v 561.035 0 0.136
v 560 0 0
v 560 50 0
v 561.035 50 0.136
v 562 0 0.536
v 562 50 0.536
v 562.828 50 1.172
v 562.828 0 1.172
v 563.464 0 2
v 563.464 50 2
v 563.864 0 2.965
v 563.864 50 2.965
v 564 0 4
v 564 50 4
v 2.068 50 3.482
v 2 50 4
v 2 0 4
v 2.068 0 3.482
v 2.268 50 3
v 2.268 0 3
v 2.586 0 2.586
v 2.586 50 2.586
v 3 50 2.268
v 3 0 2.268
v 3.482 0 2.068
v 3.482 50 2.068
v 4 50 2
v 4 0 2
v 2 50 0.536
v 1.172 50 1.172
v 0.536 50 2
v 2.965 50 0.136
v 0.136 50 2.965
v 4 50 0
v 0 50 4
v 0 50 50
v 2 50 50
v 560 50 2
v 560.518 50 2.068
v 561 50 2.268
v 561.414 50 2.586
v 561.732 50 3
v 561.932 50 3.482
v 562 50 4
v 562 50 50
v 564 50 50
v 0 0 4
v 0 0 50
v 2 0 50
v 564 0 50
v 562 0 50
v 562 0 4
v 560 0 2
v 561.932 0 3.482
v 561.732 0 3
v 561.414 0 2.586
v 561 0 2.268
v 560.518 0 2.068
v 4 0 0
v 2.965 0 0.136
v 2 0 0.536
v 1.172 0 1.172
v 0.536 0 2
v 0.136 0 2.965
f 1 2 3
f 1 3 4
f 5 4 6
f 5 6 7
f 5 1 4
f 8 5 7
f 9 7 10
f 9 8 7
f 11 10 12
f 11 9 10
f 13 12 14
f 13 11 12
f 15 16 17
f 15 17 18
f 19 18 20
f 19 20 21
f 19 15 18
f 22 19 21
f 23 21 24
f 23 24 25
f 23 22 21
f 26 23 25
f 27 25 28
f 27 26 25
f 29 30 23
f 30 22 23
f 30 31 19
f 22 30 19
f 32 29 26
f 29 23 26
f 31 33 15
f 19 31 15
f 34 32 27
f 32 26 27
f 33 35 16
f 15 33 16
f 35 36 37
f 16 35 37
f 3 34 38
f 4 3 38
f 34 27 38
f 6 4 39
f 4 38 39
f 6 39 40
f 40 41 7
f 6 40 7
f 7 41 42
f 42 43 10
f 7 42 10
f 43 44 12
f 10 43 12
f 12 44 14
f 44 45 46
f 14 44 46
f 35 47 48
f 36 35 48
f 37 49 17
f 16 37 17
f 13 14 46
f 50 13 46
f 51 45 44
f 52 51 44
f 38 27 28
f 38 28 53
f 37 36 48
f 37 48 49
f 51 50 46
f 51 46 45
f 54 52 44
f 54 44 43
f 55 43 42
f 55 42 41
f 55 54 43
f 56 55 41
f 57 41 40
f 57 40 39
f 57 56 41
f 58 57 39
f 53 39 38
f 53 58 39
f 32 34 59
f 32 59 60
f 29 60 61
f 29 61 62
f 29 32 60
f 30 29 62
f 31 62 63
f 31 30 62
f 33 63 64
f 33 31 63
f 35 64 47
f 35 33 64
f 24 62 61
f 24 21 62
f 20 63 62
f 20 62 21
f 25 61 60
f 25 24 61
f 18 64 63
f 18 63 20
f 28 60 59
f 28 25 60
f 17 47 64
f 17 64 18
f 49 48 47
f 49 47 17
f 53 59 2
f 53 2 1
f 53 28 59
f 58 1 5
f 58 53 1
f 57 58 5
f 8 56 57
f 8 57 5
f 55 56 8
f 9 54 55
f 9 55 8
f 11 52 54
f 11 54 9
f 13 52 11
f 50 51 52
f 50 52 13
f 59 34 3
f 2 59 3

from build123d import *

# Parameters (mm, degrees)
SKETCH_1_W                       = 564
SKETCH_1_H                       = 50
SM_BASE_FLANGE_1_DEPTH           = 2
SM_EDGE_FLANGE_1_STRIP_W         = 12
SM_EDGE_FLANGE_1_STRIP_H         = 2
SM_EDGE_FLANGE_1_STRIP_CUT_DEPTH = 50
SM_EDGE_FLANGE_1_DEPTH           = 50
SM_EDGE_FLANGE_2_STRIP_W         = 12
SM_EDGE_FLANGE_2_STRIP_H         = 2
SM_EDGE_FLANGE_2_STRIP_CUT_DEPTH = 50
SM_EDGE_FLANGE_2_DEPTH           = 50


# Sheet-metal steps are written as plain solids
with BuildPart() as part:
    # Sketch 1 → Базовая кромка1 (new body)
    with BuildSketch(Plane.XY):
        with Locations((282, 25)):
            Rectangle(SKETCH_1_W, SKETCH_1_H)
    extrude(amount=SM_BASE_FLANGE_1_DEPTH)

    # Ребро-кромка1 strip (across the edge) → Ребро-кромка1 strip cut (cut)
    with BuildSketch(Plane(origin=(0, 50, 2), x_dir=(1, 0, 0), z_dir=(0, -1, 0))):
        with Locations((-2, -1)):
            Rectangle(SM_EDGE_FLANGE_1_STRIP_W, SM_EDGE_FLANGE_1_STRIP_H)
    extrude(amount=SM_EDGE_FLANGE_1_STRIP_CUT_DEPTH, mode=Mode.SUBTRACT)

    # Ребро-кромка1 section (across the edge) → Ребро-кромка1 (add)
    with BuildSketch(Plane(origin=(0, 50, 2), x_dir=(1, 0, 0), z_dir=(0, -1, 0))):
        with BuildLine():
            Line((0, 2), (0, 48))
            Line((0, 48), (2, 48))
            Line((2, 48), (2, 2))
            ThreePointArc((2, 2), (2.585786438, 0.585786438), (4, 0))
            Line((4, 0), (4, -2))
            ThreePointArc((4, -2), (1.171572875, -0.828427125), (0, 2))
        make_face()
    extrude(amount=SM_EDGE_FLANGE_1_DEPTH)

    # Ребро-кромка2 strip (across the edge) → Ребро-кромка2 strip cut (cut)
    with BuildSketch(Plane(origin=(564, 0, 2), x_dir=(-1, 0, 0), z_dir=(0, 1, 0))):
        with Locations((-2, -1)):
            Rectangle(SM_EDGE_FLANGE_2_STRIP_W, SM_EDGE_FLANGE_2_STRIP_H)
    extrude(amount=SM_EDGE_FLANGE_2_STRIP_CUT_DEPTH, mode=Mode.SUBTRACT)

    # Ребро-кромка2 section (across the edge) → Ребро-кромка2 (add)
    with BuildSketch(Plane(origin=(564, 0, 2), x_dir=(-1, 0, 0), z_dir=(0, 1, 0))):
        with BuildLine():
            Line((0, 2), (0, 48))
            Line((0, 48), (2, 48))
            Line((2, 48), (2, 2))
            ThreePointArc((2, 2), (2.585786438, 0.585786438), (4, 0))
            Line((4, 0), (4, -2))
            ThreePointArc((4, -2), (1.171572875, -0.828427125), (0, 2))
        make_face()
    extrude(amount=SM_EDGE_FLANGE_2_DEPTH)


solid = part.part
